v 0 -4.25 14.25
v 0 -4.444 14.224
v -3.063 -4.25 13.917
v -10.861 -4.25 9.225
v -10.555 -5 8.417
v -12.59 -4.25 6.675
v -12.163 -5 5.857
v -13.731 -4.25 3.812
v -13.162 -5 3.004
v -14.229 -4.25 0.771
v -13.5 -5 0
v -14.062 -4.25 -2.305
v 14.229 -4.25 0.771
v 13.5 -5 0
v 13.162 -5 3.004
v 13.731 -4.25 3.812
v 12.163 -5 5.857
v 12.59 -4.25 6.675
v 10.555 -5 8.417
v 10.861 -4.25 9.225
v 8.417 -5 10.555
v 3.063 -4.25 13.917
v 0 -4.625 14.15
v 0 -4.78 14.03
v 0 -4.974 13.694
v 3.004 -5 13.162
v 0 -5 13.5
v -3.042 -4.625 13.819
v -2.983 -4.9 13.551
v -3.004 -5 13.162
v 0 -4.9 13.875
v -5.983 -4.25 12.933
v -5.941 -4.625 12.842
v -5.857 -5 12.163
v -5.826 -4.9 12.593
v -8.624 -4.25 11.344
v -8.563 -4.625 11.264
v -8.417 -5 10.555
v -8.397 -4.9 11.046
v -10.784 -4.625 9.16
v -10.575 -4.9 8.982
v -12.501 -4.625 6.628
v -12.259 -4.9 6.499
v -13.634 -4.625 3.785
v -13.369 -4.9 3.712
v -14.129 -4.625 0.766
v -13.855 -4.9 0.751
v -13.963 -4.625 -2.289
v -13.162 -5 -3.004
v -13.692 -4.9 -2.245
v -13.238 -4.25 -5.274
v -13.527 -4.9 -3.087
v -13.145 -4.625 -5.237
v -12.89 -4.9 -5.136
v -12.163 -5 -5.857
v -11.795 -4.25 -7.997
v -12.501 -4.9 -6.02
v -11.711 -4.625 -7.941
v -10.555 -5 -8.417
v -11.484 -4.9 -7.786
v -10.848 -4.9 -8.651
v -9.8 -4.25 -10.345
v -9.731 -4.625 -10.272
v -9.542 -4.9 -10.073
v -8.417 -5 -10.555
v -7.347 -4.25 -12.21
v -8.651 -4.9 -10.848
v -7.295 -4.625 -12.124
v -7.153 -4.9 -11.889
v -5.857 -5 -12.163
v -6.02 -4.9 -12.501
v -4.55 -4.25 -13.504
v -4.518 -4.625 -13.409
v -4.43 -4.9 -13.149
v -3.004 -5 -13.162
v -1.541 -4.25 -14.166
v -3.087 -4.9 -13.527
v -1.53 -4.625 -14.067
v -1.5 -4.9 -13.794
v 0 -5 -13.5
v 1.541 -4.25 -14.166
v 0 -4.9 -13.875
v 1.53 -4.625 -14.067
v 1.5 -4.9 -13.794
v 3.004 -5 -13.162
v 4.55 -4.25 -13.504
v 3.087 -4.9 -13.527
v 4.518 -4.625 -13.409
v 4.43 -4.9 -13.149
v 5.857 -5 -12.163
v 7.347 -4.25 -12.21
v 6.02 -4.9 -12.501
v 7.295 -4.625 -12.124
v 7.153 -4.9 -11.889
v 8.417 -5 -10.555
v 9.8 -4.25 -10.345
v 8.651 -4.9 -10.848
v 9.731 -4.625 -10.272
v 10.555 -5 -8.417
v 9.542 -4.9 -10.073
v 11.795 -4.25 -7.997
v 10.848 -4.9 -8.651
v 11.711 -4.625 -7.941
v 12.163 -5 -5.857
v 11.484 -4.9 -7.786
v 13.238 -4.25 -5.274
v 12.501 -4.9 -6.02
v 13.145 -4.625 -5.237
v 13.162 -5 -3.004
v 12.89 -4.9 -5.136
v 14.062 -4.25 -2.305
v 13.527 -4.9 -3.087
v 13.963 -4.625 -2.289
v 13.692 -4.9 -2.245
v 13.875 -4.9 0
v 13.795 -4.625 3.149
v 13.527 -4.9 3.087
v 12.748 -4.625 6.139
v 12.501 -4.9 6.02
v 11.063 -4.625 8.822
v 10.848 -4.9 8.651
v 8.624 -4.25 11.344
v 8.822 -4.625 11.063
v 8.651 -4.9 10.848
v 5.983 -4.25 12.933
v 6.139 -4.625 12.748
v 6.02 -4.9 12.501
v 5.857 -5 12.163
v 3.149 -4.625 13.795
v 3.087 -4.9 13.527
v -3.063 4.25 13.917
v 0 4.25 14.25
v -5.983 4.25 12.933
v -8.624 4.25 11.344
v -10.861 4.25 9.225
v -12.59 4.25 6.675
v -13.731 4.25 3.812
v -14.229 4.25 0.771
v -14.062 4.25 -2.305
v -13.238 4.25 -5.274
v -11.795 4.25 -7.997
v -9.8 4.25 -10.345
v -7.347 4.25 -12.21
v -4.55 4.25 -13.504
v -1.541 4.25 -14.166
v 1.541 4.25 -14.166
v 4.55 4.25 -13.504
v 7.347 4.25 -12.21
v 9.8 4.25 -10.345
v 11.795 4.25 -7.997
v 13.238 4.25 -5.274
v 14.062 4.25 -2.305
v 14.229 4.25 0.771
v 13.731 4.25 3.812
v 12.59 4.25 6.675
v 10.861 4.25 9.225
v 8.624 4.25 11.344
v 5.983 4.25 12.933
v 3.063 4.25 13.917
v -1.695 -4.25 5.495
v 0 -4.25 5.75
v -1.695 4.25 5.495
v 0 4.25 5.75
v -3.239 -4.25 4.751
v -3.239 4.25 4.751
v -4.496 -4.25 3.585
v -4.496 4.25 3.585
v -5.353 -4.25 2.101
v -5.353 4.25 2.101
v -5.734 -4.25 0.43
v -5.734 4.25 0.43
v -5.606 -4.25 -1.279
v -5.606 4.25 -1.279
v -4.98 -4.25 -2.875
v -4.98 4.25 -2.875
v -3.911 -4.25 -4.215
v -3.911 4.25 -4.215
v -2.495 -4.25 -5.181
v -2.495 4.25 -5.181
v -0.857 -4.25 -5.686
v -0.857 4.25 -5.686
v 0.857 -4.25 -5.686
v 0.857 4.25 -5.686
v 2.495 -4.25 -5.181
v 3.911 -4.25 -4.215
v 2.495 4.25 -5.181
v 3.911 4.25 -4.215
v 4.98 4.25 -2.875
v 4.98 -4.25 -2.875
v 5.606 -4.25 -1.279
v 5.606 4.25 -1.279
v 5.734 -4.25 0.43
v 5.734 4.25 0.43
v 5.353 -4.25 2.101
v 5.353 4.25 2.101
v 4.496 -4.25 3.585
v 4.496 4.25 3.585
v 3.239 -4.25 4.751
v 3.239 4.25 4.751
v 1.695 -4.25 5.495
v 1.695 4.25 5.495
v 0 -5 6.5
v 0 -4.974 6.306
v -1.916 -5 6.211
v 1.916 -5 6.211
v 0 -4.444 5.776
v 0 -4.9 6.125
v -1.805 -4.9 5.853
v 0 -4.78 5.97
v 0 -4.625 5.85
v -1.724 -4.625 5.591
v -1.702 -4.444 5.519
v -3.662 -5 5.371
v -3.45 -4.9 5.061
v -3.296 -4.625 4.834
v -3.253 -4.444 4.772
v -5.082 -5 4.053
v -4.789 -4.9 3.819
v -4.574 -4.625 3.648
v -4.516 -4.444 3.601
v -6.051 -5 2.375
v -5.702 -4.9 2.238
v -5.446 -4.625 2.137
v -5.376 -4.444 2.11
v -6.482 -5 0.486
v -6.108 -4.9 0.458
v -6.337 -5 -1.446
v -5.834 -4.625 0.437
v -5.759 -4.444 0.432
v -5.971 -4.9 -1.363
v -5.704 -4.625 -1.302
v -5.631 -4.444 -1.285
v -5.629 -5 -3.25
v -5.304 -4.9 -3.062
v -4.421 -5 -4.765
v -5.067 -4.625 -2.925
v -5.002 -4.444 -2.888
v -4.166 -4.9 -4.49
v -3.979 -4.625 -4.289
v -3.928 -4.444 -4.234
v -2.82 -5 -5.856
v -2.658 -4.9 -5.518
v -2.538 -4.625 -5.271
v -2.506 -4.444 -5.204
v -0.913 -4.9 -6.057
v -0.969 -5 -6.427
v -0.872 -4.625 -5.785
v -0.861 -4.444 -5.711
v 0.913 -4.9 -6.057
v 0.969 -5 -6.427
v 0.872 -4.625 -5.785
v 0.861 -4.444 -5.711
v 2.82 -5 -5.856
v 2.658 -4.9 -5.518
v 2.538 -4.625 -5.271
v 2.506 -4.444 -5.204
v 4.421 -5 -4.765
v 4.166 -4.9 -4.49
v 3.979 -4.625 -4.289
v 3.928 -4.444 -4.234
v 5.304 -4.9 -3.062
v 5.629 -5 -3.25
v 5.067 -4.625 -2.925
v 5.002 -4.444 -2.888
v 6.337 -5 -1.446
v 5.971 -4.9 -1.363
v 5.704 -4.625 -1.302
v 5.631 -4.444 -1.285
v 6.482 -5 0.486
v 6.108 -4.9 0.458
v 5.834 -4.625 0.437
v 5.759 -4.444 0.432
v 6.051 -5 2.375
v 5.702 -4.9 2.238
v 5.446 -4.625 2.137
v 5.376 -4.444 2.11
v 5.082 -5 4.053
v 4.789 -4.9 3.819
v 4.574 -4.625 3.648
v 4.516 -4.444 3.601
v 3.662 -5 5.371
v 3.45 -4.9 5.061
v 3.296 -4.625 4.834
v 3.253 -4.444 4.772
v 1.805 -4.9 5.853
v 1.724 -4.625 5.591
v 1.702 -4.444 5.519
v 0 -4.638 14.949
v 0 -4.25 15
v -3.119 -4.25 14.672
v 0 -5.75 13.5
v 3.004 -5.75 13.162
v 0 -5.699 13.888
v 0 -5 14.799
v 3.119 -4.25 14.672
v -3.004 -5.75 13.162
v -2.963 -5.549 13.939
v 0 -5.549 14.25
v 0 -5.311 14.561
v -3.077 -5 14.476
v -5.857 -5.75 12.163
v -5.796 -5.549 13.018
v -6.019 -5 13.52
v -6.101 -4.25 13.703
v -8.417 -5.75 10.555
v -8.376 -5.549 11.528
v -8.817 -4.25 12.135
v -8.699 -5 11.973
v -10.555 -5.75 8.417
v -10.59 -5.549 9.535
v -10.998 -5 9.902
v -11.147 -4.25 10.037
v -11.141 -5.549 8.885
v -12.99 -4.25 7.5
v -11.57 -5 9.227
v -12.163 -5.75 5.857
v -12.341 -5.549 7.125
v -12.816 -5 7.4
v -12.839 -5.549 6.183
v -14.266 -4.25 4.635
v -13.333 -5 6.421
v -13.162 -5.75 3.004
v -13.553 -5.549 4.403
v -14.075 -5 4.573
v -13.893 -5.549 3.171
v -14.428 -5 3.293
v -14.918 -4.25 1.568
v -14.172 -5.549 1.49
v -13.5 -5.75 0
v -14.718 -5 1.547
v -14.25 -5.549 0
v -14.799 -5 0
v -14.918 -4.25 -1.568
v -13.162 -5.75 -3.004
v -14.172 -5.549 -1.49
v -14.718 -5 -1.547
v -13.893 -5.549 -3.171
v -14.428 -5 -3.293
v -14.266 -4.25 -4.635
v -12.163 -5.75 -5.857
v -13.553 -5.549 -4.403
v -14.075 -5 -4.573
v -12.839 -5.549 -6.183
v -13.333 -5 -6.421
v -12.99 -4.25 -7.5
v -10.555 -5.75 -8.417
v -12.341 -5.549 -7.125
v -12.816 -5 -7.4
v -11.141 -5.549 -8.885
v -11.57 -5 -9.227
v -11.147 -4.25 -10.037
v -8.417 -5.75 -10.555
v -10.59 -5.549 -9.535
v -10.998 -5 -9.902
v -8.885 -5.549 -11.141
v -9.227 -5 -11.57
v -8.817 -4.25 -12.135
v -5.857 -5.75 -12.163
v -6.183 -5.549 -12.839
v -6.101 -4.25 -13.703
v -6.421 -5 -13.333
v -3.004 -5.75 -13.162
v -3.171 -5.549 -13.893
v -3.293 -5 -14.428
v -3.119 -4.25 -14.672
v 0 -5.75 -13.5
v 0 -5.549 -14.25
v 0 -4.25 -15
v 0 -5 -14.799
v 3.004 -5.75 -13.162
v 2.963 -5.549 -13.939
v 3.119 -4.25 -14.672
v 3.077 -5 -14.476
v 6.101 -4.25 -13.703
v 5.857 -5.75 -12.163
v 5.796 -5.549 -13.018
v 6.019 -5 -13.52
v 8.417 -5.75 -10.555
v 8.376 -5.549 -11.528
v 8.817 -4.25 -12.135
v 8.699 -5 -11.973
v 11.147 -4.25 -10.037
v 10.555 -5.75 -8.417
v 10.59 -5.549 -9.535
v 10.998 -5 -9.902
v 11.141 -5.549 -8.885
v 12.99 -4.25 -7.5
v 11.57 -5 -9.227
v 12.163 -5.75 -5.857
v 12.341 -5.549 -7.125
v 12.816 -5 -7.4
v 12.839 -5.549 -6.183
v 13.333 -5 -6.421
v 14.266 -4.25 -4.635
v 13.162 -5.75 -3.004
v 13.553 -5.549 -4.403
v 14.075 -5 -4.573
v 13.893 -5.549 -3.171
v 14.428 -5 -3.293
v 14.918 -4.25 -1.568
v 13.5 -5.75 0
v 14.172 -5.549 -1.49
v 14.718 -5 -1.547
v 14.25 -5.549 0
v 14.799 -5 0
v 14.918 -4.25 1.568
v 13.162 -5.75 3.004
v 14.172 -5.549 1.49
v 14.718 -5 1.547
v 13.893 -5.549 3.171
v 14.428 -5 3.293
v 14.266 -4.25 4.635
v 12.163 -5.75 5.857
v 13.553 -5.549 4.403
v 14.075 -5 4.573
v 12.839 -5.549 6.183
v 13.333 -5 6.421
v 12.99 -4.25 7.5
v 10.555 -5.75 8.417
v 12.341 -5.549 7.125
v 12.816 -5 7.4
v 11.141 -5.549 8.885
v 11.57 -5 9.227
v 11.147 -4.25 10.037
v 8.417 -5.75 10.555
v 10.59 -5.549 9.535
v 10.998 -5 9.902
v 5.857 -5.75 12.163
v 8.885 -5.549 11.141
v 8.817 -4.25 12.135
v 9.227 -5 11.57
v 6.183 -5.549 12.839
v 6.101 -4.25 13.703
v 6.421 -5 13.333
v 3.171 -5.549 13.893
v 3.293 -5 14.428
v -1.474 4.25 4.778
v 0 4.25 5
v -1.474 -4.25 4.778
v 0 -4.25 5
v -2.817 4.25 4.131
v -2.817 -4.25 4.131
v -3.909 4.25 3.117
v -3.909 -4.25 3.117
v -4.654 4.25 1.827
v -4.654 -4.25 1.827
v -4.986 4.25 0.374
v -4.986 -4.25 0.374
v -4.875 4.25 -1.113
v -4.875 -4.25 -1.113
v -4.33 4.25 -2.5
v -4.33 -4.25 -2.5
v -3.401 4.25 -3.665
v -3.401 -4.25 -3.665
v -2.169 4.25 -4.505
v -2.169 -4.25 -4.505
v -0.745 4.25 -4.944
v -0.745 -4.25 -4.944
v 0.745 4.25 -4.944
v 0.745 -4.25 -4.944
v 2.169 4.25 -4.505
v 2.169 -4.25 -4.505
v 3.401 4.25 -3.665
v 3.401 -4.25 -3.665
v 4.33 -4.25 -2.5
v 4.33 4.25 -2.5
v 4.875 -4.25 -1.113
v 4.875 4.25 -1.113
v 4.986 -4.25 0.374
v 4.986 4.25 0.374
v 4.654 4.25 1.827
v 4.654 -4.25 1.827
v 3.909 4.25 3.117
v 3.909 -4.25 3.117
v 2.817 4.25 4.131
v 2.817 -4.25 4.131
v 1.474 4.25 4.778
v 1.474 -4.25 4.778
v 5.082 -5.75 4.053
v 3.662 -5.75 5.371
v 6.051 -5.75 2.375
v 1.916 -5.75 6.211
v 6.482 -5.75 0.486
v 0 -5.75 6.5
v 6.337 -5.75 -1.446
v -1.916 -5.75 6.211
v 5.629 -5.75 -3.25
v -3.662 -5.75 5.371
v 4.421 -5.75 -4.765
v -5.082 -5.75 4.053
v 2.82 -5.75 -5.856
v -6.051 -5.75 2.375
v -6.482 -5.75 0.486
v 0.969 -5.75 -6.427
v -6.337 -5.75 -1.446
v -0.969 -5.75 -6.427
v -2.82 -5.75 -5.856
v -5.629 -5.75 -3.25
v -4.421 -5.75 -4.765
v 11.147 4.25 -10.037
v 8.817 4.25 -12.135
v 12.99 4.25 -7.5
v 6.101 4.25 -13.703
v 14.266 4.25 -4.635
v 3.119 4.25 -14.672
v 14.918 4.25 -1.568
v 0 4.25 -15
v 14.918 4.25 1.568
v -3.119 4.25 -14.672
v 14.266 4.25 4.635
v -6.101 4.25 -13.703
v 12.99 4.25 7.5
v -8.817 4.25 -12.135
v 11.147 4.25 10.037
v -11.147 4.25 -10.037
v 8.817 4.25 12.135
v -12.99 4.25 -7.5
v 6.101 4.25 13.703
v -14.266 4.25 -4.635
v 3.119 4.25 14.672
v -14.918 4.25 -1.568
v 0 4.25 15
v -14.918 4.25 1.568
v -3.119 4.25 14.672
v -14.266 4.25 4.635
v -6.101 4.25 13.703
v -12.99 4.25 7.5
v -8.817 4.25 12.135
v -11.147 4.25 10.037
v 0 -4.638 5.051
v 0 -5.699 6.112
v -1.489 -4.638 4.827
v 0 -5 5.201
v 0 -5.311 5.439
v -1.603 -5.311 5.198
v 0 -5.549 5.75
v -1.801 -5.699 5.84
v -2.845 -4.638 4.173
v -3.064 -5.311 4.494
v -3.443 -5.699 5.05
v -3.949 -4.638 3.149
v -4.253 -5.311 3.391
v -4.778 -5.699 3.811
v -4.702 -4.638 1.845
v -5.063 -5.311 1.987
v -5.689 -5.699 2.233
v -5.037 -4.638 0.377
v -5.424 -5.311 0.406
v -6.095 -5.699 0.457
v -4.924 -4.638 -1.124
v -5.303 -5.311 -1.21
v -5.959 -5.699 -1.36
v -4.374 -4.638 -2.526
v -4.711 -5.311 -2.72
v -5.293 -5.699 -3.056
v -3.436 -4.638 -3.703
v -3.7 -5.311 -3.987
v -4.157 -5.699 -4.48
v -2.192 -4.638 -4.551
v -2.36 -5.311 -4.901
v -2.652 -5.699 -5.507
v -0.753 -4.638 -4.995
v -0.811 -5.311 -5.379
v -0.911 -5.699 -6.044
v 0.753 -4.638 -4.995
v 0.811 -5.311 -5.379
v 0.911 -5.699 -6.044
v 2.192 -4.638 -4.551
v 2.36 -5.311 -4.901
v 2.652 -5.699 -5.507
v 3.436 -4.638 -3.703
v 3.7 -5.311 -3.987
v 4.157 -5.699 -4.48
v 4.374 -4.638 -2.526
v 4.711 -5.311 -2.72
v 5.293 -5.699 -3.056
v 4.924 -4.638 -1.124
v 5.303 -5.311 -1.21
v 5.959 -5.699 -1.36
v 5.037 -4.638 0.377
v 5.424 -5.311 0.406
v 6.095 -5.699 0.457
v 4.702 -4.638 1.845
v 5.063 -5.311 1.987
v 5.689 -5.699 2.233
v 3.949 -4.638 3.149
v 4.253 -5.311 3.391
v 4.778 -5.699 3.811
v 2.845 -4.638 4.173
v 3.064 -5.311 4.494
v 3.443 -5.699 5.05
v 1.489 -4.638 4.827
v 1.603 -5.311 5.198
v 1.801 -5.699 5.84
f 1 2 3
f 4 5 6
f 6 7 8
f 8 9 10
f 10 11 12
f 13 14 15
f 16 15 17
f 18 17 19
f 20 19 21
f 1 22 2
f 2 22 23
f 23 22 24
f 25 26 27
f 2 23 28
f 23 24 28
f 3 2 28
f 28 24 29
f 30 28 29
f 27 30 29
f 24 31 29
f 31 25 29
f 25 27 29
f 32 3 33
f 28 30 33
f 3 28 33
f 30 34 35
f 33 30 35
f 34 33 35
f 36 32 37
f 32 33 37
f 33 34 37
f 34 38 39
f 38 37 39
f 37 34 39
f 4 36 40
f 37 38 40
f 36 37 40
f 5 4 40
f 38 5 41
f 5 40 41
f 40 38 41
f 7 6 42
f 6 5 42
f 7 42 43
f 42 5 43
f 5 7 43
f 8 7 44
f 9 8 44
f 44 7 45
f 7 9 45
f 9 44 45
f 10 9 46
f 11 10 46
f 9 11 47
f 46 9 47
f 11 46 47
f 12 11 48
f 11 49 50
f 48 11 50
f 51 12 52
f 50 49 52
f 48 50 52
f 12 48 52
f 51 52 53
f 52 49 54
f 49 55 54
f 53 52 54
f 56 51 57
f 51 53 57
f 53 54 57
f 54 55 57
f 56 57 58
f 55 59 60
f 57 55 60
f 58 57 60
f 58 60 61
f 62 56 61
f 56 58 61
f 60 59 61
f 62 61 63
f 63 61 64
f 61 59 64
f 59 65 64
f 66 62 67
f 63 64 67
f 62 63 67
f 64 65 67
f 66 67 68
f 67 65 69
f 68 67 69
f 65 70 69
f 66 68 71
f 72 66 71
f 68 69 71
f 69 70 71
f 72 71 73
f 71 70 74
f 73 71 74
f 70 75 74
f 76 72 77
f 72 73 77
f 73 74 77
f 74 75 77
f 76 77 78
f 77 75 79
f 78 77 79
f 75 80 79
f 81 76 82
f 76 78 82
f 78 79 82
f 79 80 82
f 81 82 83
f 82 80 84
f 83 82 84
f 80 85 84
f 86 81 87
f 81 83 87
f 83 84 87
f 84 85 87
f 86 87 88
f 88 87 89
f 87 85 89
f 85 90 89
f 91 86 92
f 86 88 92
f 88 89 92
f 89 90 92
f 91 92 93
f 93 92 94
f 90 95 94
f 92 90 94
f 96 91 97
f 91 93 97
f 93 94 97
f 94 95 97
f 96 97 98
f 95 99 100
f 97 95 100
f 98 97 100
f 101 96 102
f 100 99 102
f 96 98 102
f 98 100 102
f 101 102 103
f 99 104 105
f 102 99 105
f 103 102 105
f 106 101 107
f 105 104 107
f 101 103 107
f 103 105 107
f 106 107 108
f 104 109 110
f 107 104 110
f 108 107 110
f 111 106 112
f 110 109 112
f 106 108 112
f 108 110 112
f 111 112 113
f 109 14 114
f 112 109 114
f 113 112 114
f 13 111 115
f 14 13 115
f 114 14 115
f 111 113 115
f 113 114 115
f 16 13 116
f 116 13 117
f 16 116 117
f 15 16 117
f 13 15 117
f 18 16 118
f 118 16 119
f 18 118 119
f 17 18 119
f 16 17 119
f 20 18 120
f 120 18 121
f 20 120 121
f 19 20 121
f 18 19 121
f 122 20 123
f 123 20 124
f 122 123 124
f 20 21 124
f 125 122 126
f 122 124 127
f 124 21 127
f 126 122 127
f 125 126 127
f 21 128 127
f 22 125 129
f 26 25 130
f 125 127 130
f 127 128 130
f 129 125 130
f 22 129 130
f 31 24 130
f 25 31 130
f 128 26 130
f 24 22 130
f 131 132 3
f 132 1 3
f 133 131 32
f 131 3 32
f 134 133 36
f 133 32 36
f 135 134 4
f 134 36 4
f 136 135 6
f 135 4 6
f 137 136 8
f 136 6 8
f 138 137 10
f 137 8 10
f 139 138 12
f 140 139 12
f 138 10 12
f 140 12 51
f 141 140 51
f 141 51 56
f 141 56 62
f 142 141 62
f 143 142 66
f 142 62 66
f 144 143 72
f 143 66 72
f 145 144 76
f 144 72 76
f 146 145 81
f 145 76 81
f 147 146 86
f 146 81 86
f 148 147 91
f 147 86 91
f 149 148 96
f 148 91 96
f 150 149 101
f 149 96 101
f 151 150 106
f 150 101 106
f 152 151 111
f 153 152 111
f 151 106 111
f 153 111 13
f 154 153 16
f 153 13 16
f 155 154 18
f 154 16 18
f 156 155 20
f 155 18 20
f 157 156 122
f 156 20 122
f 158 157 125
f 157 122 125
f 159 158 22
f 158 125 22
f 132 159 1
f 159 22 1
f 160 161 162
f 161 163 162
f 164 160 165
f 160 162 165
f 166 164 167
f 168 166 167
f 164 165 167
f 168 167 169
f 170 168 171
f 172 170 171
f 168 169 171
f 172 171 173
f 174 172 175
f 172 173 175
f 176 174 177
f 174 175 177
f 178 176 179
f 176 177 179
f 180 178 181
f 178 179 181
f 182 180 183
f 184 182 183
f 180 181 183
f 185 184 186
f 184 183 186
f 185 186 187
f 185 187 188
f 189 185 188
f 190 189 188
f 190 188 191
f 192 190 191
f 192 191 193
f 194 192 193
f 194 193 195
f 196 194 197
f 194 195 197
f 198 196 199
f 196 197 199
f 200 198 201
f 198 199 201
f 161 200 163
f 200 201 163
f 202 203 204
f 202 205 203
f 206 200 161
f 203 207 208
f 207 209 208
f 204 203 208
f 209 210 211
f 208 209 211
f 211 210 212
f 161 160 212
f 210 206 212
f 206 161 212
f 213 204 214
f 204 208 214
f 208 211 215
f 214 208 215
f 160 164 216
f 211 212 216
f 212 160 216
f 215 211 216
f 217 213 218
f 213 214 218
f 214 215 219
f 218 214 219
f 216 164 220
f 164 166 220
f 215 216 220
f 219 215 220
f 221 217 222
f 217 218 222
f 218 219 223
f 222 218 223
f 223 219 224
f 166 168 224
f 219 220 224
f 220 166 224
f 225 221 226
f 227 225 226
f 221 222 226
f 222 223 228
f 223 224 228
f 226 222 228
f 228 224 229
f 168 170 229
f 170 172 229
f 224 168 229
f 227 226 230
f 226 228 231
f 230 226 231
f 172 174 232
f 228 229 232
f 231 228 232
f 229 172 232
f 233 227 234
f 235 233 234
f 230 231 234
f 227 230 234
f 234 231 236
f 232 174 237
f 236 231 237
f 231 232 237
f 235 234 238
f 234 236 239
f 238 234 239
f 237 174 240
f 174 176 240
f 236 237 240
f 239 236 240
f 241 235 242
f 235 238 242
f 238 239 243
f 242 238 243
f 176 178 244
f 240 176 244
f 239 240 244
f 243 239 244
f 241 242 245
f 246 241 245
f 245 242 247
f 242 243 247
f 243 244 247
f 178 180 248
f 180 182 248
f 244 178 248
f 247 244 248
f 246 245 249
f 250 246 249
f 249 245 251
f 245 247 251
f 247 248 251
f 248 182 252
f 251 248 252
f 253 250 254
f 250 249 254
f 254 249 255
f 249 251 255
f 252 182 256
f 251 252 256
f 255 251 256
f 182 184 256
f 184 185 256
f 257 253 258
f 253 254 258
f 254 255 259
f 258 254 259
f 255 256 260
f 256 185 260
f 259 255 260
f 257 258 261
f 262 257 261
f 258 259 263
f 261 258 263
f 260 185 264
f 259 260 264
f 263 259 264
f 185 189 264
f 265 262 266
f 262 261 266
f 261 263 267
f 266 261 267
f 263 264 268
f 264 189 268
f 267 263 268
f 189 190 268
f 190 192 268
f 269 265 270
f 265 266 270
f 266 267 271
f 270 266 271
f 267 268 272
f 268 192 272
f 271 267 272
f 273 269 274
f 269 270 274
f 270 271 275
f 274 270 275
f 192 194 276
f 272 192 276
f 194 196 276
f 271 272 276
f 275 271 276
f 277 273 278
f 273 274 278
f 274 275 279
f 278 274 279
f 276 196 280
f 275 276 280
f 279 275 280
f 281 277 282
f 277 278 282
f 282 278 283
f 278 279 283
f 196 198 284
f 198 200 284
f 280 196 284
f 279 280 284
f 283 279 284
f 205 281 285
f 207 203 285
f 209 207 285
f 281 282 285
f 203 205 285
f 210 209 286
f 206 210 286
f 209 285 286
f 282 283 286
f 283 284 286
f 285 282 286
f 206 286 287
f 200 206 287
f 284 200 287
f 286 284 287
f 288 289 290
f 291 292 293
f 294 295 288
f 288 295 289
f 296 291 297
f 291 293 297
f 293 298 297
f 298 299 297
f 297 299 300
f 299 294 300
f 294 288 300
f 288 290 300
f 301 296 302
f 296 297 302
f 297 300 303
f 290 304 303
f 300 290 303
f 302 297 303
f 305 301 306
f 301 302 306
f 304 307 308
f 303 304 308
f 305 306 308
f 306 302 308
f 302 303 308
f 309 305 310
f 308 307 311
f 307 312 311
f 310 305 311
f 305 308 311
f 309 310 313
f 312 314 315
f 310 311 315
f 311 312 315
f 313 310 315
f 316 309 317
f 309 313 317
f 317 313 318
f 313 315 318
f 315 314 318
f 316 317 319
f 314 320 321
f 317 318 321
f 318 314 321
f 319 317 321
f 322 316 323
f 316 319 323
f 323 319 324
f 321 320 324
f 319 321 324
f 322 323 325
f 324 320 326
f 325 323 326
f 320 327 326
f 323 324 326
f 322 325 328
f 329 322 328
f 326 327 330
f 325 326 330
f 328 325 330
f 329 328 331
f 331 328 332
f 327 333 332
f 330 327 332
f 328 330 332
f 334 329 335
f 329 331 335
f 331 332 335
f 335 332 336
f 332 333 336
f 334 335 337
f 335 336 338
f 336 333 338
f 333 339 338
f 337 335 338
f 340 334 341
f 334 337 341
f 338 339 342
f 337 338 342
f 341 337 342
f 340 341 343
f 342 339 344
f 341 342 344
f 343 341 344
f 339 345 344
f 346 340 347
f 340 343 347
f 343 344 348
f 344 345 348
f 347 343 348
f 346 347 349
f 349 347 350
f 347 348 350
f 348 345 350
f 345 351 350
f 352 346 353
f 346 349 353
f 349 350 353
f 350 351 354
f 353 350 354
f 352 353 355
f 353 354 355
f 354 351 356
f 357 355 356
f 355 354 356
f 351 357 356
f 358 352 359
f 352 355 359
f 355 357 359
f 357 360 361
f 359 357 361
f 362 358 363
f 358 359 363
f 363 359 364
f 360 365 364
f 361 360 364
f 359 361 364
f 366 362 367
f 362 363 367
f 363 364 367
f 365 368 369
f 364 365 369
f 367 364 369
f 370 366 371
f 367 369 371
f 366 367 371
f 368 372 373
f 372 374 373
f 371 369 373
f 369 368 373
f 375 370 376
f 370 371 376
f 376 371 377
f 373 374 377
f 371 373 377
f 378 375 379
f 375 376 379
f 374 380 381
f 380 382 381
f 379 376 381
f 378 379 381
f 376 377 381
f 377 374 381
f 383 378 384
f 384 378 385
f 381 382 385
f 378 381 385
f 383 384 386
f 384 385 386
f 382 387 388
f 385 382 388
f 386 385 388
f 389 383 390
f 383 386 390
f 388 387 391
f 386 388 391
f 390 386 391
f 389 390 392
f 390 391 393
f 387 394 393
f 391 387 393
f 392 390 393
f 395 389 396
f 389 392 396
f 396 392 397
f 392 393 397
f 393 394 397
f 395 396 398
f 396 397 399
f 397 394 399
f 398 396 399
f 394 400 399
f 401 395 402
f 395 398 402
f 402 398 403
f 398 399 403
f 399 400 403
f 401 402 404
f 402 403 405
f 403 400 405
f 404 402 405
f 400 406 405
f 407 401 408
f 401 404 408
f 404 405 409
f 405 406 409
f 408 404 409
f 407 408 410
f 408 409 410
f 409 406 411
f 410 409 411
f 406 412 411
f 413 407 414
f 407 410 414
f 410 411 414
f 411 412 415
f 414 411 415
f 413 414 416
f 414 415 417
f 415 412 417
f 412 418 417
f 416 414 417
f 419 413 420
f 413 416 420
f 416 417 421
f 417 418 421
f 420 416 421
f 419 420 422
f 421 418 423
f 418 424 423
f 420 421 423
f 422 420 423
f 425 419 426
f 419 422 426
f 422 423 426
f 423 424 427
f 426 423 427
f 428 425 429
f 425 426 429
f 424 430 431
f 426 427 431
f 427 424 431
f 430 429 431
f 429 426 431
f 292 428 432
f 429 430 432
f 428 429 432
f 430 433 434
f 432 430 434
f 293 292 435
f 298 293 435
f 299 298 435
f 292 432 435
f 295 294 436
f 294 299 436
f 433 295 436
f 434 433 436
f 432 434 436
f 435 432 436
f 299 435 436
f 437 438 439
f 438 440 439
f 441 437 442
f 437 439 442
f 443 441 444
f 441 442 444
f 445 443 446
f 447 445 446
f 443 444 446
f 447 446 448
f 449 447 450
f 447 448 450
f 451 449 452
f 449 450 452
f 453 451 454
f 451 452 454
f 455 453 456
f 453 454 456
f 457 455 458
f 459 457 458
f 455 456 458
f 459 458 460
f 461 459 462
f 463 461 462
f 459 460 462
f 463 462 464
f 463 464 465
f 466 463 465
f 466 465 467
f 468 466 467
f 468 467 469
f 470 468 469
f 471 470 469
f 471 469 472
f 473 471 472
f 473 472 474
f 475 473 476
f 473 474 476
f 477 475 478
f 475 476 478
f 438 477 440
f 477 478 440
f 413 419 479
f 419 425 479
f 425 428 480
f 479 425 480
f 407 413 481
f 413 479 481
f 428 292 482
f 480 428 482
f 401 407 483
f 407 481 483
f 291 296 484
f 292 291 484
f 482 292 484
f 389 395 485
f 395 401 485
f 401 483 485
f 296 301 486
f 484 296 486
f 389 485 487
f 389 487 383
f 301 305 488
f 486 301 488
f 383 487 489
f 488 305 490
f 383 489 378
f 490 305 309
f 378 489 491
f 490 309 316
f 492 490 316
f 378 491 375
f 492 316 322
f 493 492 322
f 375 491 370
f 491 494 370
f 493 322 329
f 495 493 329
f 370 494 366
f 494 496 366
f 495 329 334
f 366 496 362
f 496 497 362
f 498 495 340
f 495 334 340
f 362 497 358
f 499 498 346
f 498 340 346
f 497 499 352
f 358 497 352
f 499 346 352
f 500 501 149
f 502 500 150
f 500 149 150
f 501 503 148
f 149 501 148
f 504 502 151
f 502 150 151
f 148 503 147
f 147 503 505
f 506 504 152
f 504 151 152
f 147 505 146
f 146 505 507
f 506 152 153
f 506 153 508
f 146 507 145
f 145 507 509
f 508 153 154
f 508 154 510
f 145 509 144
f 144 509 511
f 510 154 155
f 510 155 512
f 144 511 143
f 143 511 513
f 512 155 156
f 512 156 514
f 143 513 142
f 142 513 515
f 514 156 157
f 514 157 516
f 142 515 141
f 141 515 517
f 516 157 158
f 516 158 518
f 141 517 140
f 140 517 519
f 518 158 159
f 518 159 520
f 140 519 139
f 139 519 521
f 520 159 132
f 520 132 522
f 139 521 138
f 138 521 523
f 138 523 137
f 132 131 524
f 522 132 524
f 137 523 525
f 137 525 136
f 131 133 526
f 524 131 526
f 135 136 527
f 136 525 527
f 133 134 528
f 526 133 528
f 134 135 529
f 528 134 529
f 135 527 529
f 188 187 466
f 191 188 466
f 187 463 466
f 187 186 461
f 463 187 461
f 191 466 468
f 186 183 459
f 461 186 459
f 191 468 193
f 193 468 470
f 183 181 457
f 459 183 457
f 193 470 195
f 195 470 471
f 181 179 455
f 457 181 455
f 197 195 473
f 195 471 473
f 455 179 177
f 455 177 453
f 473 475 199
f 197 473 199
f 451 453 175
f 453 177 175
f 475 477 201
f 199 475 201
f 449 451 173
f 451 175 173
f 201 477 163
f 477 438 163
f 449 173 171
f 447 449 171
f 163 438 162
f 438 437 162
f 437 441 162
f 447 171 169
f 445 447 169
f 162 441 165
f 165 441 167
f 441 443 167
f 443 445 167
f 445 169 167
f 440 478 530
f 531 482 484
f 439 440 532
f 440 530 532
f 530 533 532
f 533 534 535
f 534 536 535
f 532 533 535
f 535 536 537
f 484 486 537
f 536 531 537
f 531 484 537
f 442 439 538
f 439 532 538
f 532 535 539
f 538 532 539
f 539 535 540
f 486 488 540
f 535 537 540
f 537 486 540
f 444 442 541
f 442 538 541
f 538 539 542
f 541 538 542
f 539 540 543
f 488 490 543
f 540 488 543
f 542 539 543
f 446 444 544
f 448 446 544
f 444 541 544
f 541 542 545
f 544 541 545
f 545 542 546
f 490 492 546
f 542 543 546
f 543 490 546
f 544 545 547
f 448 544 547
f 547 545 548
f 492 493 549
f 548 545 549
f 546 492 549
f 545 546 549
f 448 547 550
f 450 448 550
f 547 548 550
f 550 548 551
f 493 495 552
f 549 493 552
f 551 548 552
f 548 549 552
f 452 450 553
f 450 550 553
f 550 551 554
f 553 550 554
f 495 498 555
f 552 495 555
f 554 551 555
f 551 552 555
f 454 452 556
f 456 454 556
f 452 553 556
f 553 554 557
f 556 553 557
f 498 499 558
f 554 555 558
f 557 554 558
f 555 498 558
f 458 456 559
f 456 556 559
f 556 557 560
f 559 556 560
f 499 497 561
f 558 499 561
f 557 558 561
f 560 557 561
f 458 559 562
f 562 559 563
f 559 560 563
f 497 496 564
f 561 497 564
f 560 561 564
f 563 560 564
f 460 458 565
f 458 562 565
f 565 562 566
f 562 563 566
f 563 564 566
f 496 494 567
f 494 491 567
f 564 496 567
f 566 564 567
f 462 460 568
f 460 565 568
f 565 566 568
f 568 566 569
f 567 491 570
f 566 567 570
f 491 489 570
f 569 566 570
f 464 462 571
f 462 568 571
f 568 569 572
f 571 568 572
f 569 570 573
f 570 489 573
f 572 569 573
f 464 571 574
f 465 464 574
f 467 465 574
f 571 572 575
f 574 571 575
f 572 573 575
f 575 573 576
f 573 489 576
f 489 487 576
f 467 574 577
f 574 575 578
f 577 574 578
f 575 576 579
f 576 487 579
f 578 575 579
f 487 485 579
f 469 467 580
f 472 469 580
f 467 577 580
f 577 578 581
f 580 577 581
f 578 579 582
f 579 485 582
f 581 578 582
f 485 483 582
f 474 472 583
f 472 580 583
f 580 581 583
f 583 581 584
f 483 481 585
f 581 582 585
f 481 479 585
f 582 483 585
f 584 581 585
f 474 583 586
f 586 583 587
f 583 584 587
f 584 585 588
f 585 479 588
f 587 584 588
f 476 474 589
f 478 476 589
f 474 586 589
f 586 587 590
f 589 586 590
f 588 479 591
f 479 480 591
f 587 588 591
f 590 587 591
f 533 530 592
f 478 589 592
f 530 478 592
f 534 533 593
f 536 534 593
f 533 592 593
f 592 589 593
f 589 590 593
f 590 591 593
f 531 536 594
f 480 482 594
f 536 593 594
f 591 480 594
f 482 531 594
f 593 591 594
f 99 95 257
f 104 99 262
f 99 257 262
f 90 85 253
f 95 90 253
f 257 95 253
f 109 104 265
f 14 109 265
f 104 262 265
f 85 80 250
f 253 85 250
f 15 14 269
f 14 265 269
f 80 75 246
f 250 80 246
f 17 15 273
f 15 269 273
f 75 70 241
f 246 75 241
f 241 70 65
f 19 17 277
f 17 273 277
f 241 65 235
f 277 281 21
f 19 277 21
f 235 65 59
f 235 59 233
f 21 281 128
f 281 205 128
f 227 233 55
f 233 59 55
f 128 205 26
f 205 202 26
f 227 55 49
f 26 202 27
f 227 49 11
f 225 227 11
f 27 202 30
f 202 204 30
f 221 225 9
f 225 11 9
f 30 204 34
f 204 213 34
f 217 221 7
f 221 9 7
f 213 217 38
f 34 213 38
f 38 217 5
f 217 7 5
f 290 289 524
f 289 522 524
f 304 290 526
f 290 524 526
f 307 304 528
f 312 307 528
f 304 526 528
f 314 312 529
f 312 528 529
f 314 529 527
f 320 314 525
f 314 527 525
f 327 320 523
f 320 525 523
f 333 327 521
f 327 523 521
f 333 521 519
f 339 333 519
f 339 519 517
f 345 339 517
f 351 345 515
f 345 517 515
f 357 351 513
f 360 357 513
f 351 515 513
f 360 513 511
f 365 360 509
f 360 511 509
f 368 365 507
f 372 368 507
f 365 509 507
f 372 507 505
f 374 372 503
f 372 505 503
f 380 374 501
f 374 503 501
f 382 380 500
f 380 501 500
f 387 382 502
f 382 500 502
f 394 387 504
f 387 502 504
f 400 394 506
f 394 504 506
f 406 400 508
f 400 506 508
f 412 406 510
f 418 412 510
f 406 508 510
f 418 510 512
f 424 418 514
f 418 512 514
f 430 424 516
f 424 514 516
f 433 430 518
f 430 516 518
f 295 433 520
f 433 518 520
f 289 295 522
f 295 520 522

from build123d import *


with BuildPart() as part:
    # Sketch2 → Revolve1 (revolve)
    with BuildSketch(Plane(origin=(0, 0, 0), x_dir=(0, 0, -1), z_dir=(1, 0, 0))):
        with BuildLine():
            Line((-5, 4.25), (-5, -4.25))
            ThreePointArc((-5, -4.25), (-5.439339828, -5.310660172), (-6.5, -5.75))
            Line((-6.5, -5.75), (-13.5, -5.75))
            ThreePointArc((-13.5, -5.75), (-14.560660172, -5.310660172), (-15, -4.25))
            Line((-15, -4.25), (-15, 4.25))
            Line((-15, 4.25), (-14.25, 4.25))
            Line((-14.25, 4.25), (-14.25, -4.25))
            ThreePointArc((-14.25, -4.25), (-14.030330086, -4.780330086), (-13.5, -5))
            Line((-13.5, -5), (-6.5, -5))
            ThreePointArc((-6.5, -5), (-5.969669914, -4.780330086), (-5.75, -4.25))
            Line((-5.75, -4.25), (-5.75, 4.25))
            Line((-5.75, 4.25), (-5, 4.25))
        make_face()
    revolve(axis=Axis((0, 14.872392435, 0), (0, -1, 0)))


solid = part.part
